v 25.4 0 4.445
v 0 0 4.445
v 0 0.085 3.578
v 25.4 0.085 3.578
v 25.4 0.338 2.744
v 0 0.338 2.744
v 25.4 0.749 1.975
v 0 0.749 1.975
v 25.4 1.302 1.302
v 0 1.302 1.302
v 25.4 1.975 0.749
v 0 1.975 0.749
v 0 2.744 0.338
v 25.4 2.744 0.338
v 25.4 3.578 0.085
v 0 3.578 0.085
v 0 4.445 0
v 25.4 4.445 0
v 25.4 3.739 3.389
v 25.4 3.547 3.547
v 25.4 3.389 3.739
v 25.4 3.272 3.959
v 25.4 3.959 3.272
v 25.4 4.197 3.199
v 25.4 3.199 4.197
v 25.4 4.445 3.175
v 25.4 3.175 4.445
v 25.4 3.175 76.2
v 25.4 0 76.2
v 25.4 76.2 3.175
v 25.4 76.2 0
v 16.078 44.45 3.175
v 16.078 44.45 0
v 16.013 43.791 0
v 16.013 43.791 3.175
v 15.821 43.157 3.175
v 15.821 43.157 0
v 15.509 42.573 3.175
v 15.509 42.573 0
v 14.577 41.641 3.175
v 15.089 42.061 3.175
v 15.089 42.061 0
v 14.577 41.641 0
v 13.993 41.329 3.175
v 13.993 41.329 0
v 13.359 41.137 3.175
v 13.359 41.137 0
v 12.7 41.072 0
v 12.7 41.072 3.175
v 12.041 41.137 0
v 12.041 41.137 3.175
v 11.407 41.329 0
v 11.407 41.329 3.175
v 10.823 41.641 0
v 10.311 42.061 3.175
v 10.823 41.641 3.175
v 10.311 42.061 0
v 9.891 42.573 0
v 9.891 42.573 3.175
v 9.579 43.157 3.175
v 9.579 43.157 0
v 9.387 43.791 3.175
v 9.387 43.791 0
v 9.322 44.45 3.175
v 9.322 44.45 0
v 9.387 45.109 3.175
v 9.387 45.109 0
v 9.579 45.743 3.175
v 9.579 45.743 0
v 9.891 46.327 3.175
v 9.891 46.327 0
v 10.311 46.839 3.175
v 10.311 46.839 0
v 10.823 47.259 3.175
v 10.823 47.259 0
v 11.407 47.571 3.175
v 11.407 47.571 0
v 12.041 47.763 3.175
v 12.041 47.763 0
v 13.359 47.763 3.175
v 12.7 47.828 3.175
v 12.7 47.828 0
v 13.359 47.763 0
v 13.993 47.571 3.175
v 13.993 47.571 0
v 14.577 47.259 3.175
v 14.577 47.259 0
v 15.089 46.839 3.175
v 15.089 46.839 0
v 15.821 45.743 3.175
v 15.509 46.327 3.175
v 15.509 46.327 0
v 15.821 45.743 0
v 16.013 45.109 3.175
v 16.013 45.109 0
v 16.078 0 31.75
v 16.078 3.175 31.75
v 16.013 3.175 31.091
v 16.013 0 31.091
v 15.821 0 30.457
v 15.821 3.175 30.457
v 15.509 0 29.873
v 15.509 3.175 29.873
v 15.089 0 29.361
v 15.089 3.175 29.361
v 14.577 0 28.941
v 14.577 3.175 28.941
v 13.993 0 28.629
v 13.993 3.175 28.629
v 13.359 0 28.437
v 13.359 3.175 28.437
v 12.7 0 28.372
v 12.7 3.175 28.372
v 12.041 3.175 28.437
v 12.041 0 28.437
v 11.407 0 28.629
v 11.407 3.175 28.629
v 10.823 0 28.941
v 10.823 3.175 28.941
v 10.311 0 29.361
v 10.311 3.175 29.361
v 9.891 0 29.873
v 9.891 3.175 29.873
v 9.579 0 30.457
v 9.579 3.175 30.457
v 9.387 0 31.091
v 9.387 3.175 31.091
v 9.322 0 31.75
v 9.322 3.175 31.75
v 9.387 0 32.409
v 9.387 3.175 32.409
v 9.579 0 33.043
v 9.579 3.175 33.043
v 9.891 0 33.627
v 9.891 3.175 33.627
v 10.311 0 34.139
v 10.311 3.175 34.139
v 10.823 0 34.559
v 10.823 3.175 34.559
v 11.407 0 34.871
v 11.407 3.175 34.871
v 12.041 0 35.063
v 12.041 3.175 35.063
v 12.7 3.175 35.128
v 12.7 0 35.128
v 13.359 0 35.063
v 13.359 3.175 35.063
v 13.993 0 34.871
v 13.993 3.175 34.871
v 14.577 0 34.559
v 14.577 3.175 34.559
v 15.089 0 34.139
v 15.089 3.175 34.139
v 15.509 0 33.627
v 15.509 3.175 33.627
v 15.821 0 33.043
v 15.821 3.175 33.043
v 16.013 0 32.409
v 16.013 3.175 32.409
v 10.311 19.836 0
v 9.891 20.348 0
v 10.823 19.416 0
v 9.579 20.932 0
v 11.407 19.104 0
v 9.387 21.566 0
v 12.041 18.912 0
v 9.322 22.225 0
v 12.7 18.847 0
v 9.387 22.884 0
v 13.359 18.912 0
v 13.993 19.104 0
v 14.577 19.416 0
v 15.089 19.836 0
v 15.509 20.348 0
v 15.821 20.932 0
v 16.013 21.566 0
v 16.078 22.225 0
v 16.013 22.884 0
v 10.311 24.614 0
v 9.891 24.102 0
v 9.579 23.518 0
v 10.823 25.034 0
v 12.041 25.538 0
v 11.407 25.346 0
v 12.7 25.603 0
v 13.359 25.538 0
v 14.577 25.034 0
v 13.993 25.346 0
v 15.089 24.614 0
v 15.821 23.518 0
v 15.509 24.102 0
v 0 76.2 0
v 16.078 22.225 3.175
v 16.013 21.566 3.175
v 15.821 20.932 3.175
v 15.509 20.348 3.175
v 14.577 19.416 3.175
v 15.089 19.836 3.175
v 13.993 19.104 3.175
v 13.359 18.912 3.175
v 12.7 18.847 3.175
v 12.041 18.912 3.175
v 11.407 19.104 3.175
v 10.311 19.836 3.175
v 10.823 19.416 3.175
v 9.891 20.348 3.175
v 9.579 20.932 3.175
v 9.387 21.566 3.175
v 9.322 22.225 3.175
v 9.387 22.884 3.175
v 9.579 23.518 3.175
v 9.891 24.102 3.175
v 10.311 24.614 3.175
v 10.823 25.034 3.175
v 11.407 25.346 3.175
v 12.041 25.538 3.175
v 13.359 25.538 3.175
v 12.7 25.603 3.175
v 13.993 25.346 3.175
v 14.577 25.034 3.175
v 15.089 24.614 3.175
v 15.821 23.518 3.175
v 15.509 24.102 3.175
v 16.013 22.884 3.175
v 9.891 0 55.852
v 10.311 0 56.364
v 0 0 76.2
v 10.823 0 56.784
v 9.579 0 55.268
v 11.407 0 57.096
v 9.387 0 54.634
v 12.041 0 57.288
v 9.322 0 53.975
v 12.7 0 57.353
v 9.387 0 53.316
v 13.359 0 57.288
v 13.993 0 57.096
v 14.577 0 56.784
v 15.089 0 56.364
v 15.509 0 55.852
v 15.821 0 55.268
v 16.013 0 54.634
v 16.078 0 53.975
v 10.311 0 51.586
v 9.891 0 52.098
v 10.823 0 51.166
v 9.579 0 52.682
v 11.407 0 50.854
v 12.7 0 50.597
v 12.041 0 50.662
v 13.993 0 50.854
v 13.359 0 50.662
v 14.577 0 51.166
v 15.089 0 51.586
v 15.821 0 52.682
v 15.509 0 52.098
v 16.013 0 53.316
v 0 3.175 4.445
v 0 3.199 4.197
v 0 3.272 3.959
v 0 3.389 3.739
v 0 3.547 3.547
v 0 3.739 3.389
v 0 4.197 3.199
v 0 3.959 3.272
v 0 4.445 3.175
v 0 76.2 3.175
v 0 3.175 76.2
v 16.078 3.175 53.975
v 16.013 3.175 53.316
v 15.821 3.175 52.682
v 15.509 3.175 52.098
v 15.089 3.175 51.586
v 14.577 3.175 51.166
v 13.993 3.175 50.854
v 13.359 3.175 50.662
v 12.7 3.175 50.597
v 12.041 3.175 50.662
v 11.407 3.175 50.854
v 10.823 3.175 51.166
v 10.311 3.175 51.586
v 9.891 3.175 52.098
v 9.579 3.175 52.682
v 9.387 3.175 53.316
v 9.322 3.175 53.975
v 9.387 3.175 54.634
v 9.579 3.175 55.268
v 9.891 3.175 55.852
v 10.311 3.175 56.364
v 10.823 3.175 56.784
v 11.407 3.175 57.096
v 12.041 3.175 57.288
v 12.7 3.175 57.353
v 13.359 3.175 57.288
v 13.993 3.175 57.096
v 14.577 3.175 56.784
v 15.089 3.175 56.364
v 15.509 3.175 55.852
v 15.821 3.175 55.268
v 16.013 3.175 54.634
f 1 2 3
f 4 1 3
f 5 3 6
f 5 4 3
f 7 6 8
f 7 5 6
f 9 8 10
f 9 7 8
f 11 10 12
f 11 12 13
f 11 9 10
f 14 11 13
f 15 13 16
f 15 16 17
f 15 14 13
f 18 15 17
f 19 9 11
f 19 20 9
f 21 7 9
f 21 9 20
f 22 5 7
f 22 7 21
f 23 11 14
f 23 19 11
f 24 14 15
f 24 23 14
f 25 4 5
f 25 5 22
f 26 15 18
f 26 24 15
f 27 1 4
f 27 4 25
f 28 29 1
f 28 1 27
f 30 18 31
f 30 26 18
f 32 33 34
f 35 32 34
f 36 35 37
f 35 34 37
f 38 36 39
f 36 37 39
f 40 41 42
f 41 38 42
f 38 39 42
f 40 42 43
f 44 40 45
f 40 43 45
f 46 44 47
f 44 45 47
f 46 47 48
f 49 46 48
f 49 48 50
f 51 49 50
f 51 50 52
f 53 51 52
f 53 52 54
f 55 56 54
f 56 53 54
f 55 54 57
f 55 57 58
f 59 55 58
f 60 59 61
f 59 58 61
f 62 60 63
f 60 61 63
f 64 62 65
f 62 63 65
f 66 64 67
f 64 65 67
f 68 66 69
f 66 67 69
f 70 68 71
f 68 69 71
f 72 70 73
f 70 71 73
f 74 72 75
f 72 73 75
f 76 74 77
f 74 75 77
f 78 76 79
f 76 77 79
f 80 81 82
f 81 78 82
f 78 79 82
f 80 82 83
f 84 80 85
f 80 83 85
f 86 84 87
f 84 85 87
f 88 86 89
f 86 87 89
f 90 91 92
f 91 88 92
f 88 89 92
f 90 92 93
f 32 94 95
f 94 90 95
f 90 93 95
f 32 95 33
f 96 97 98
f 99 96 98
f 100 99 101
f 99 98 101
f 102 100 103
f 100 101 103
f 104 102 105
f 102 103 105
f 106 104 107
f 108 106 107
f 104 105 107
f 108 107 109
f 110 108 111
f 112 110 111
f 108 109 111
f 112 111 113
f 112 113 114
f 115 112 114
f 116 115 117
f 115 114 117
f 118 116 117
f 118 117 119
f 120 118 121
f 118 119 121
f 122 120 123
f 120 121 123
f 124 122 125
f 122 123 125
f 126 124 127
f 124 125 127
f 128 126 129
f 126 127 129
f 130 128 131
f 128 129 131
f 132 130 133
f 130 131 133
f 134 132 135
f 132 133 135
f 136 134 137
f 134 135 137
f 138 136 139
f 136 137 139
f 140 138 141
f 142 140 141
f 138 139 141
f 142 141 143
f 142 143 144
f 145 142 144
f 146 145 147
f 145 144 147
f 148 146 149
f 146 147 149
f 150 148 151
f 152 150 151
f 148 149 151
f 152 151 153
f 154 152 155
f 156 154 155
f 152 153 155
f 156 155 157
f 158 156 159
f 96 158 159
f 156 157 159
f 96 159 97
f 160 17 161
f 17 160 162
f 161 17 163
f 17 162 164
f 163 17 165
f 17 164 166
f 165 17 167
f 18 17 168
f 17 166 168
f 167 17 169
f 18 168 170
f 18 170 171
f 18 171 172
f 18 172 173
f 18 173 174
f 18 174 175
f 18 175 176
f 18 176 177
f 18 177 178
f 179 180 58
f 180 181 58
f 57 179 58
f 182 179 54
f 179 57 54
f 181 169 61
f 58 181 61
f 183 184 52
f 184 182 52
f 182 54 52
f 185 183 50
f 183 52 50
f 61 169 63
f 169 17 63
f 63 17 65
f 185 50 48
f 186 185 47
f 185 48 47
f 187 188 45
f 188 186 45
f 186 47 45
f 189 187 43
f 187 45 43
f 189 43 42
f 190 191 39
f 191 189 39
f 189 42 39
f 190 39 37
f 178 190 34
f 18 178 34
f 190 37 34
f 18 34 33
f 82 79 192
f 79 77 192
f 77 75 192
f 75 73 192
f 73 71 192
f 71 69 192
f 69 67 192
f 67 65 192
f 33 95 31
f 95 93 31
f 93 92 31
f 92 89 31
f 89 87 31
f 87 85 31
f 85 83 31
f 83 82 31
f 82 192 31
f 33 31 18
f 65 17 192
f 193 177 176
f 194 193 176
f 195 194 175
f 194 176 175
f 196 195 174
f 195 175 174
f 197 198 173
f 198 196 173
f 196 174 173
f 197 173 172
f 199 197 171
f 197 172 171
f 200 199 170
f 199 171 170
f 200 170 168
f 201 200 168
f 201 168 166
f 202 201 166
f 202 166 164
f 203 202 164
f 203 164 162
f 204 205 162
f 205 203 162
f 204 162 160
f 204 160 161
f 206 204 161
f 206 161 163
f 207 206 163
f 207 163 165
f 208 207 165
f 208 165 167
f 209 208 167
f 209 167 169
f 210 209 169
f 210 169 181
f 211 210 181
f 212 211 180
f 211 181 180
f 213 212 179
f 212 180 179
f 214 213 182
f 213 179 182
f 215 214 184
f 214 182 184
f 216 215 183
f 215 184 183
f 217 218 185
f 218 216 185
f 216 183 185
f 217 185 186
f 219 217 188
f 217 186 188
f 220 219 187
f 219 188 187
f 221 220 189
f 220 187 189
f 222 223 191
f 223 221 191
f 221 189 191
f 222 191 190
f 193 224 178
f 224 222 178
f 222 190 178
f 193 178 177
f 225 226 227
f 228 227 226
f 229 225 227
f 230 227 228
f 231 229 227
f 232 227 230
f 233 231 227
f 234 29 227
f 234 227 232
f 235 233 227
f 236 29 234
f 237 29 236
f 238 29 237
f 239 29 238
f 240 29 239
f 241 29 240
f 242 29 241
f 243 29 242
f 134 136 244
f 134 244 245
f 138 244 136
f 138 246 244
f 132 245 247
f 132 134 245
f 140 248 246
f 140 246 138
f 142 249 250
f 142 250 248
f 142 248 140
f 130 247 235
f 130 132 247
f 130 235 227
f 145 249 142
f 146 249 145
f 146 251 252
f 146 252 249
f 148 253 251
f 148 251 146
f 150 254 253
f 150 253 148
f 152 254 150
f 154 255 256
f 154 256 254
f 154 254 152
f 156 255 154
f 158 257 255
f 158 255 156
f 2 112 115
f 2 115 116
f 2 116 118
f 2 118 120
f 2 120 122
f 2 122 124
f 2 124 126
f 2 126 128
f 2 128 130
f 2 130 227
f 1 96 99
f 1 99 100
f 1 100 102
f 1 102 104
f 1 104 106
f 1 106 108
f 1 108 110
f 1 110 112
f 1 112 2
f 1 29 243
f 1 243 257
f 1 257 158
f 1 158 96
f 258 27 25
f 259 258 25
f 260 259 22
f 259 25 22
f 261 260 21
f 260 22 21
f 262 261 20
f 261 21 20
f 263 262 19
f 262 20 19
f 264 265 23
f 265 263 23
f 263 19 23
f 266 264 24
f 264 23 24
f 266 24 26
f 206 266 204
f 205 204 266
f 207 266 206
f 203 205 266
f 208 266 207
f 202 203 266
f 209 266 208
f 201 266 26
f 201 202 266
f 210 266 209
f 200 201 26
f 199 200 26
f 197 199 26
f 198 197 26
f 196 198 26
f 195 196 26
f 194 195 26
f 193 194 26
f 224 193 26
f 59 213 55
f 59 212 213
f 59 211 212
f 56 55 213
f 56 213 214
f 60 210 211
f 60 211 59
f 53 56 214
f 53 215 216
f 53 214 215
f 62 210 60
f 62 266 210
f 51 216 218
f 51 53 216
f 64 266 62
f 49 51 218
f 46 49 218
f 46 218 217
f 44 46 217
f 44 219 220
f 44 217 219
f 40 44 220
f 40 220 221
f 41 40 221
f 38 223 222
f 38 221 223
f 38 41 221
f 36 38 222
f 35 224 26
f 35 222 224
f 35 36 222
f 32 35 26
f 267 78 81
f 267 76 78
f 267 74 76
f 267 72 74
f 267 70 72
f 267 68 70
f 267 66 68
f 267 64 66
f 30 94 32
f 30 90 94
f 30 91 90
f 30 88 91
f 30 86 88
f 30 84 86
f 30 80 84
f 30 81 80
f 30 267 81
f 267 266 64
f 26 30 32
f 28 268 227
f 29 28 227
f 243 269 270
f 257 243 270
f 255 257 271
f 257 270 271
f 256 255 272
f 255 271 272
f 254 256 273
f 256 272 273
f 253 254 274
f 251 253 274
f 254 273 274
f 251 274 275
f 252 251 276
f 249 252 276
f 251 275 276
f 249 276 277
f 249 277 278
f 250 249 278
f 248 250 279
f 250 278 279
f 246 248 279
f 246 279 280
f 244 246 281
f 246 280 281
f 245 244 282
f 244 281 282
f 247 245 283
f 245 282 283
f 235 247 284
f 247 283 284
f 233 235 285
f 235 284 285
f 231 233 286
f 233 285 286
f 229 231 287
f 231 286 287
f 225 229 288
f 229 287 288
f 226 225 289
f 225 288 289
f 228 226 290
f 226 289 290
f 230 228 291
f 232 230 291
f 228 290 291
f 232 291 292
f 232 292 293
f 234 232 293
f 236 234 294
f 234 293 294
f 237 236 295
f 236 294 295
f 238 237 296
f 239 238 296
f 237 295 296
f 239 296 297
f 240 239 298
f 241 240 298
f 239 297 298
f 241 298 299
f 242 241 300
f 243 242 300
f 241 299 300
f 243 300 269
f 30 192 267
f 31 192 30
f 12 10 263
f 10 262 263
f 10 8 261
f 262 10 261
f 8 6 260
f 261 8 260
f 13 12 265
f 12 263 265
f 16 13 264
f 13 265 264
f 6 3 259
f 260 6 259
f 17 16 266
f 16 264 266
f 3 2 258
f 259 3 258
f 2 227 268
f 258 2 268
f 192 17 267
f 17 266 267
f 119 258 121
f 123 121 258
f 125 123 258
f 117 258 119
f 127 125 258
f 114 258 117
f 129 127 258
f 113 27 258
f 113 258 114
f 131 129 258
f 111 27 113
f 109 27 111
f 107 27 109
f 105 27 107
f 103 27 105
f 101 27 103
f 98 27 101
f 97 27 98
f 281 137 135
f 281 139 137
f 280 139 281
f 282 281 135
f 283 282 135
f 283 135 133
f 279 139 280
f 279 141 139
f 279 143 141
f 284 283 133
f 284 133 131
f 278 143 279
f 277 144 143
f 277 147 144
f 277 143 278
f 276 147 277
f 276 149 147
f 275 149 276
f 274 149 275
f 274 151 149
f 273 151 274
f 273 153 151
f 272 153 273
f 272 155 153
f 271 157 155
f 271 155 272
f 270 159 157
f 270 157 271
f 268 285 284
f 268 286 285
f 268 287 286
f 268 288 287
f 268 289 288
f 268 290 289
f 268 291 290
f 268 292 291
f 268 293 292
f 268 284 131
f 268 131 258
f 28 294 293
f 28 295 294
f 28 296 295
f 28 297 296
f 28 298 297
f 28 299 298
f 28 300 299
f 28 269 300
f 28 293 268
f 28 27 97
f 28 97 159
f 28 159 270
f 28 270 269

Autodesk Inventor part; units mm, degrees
ref_plane "YZ Plane" through (0, 0, 0) normal (1, 0, 0) x (0, 1, 0)
ref_plane "XZ Plane" through (0, 0, 0) normal (0, 1, 0) x (-1, 0, 0)
ref_plane "XY Plane" through (0, 0, 0) normal (0, 0, 1) x (1, 0, 0)
sketch "Sketch1" plane through (0, 0, 0) normal (0, 0, 1) x (1, 0, 0)
  line L0 (0, 0) -> (147.699314, 0)
  line L1 (147.699314, -25.4) -> (0, -25.4)
  line L2 (0, 0) -> (73.849657, 0)
  line L3 (73.849657, 0) -> (73.849657, -3.175)
  line L4 (73.849657, -3.175) -> (72.249457, -3.175)
  line L5 (72.249457, -3.175) -> (72.249457, -9.525)
  line L6 (72.249457, -9.525) -> (75.424457, -9.525)
  line L7 (75.424457, -9.525) -> (75.424457, -3.175)
  line L8 (75.424457, -3.175) -> (73.849657, -3.175)
  line L9 (73.849657, -25.4) -> (73.849657, -22.225)
  line L10 (73.849657, -22.225) -> (72.249457, -22.225)
  line L11 (72.249457, -22.225) -> (72.249457, -15.875)
  line L12 (72.249457, -15.875) -> (75.424457, -15.875)
  line L13 (75.424457, -15.875) -> (75.424457, -22.225)
  line L14 (75.424457, -22.225) -> (73.849657, -22.225)
  dimension "d8" = 6.7564
sketch "Sketch3" plane through (0, 3.175, 76.2) normal (0, 1, 0) x (1, 0, 0)
  line L0 (0, 0) -> (25.4, 0) projected
  circle A0 centre (12.7, 44.45) radius 3.3782
  circle A1 centre (12.7, 22.225) radius 3.3782
  line L1 (0, 76.2) -> (0, 73.025) projected
  dimension "d21" = 6.7564
  dimension "d22" = 6.7564
  dimension "d23" = 12.7
  dimension "d24" = 22.225
  dimension "d25" = 22.225
sketch "Sketch1 outline for Plate1" plane through (0, 0, 0) normal (0, 0, 1) x (1, 0, 0)
  line L0 (0, 0) -> (0, 76.2)
  line L1 (25.4, 0) -> (0, 0)
  line L2 (0, 76.2) -> (25.4, 76.2)
  line L3 (25.4, 76.2) -> (25.4, 0)
  circle A0 centre (12.7, 22.225) radius 3.3782
  circle A1 centre (12.7, 44.45) radius 3.3782
extrude "Plate1" add sketch "Sketch1 outline for Plate1" along normal blind 3.175
sketch "Sketch2" plane through (25.4, 3.175, 0) normal (0, -1, 0) x (1, 0, 0)
  line L0 (-25.4, 0) -> (0, 0)
  line L1 (0, 0) -> (0, 76.2)
  line L2 (0, 76.2) -> (-25.4, 76.2)
  line L3 (-25.4, 76.2) -> (-25.4, 0)
edge flange "Flange1" height 76.2 angle 90 thickness 3.175 bend radius 1.27 thickness toward (0, -1, 0) relief tear relief width 3.175 relief depth 1.5875 edges at (12.7, 0, 3.175) wall of the first edge with corners at (0, 3.175, 0) (25.4, 3.175, 0) (25.4, 3.175, 76.2) (0, 3.175, 76.2)
bend "Bend1"
corner "Corner1"
extrude "Cut1" cut sketch "Sketch3" against normal blind 3.175
equation "\"d11\" = BendReliefWidth"
equation "\"d12\" = BendReliefDepth"
equation "\"d13\" = MinimumRemnant"
equation "\"d14\" = BendRadius"
equation "\"d18\" = CornerReliefSize"
equation "\"d19\" = GapSize"
equation "\"d20\" = JacobiRadiusSize"
equation "\"BendRadius\" = Thickness"
equation "\"BendReliefWidth\" = Thickness"
equation "\"BendReliefDepth\" = 0.5 * Thickness"
equation "\"CornerReliefSize\" = 4 * Thickness"
equation "\"MinimumRemnant\" = 2 * Thickness"
equation "\"TransitionRadius\" = BendRadius"
equation "\"JacobiRadiusSize\" = BendRadius"
equation "\"GapSize\" = Thickness"
equation "\"d10\" = BendRadius"
equation "\"d6\" = Thickness"
equation "\"Thickness\" = 3.175"
properties part number "Rebuild Gusset 4" material "Aluminum 6061"
